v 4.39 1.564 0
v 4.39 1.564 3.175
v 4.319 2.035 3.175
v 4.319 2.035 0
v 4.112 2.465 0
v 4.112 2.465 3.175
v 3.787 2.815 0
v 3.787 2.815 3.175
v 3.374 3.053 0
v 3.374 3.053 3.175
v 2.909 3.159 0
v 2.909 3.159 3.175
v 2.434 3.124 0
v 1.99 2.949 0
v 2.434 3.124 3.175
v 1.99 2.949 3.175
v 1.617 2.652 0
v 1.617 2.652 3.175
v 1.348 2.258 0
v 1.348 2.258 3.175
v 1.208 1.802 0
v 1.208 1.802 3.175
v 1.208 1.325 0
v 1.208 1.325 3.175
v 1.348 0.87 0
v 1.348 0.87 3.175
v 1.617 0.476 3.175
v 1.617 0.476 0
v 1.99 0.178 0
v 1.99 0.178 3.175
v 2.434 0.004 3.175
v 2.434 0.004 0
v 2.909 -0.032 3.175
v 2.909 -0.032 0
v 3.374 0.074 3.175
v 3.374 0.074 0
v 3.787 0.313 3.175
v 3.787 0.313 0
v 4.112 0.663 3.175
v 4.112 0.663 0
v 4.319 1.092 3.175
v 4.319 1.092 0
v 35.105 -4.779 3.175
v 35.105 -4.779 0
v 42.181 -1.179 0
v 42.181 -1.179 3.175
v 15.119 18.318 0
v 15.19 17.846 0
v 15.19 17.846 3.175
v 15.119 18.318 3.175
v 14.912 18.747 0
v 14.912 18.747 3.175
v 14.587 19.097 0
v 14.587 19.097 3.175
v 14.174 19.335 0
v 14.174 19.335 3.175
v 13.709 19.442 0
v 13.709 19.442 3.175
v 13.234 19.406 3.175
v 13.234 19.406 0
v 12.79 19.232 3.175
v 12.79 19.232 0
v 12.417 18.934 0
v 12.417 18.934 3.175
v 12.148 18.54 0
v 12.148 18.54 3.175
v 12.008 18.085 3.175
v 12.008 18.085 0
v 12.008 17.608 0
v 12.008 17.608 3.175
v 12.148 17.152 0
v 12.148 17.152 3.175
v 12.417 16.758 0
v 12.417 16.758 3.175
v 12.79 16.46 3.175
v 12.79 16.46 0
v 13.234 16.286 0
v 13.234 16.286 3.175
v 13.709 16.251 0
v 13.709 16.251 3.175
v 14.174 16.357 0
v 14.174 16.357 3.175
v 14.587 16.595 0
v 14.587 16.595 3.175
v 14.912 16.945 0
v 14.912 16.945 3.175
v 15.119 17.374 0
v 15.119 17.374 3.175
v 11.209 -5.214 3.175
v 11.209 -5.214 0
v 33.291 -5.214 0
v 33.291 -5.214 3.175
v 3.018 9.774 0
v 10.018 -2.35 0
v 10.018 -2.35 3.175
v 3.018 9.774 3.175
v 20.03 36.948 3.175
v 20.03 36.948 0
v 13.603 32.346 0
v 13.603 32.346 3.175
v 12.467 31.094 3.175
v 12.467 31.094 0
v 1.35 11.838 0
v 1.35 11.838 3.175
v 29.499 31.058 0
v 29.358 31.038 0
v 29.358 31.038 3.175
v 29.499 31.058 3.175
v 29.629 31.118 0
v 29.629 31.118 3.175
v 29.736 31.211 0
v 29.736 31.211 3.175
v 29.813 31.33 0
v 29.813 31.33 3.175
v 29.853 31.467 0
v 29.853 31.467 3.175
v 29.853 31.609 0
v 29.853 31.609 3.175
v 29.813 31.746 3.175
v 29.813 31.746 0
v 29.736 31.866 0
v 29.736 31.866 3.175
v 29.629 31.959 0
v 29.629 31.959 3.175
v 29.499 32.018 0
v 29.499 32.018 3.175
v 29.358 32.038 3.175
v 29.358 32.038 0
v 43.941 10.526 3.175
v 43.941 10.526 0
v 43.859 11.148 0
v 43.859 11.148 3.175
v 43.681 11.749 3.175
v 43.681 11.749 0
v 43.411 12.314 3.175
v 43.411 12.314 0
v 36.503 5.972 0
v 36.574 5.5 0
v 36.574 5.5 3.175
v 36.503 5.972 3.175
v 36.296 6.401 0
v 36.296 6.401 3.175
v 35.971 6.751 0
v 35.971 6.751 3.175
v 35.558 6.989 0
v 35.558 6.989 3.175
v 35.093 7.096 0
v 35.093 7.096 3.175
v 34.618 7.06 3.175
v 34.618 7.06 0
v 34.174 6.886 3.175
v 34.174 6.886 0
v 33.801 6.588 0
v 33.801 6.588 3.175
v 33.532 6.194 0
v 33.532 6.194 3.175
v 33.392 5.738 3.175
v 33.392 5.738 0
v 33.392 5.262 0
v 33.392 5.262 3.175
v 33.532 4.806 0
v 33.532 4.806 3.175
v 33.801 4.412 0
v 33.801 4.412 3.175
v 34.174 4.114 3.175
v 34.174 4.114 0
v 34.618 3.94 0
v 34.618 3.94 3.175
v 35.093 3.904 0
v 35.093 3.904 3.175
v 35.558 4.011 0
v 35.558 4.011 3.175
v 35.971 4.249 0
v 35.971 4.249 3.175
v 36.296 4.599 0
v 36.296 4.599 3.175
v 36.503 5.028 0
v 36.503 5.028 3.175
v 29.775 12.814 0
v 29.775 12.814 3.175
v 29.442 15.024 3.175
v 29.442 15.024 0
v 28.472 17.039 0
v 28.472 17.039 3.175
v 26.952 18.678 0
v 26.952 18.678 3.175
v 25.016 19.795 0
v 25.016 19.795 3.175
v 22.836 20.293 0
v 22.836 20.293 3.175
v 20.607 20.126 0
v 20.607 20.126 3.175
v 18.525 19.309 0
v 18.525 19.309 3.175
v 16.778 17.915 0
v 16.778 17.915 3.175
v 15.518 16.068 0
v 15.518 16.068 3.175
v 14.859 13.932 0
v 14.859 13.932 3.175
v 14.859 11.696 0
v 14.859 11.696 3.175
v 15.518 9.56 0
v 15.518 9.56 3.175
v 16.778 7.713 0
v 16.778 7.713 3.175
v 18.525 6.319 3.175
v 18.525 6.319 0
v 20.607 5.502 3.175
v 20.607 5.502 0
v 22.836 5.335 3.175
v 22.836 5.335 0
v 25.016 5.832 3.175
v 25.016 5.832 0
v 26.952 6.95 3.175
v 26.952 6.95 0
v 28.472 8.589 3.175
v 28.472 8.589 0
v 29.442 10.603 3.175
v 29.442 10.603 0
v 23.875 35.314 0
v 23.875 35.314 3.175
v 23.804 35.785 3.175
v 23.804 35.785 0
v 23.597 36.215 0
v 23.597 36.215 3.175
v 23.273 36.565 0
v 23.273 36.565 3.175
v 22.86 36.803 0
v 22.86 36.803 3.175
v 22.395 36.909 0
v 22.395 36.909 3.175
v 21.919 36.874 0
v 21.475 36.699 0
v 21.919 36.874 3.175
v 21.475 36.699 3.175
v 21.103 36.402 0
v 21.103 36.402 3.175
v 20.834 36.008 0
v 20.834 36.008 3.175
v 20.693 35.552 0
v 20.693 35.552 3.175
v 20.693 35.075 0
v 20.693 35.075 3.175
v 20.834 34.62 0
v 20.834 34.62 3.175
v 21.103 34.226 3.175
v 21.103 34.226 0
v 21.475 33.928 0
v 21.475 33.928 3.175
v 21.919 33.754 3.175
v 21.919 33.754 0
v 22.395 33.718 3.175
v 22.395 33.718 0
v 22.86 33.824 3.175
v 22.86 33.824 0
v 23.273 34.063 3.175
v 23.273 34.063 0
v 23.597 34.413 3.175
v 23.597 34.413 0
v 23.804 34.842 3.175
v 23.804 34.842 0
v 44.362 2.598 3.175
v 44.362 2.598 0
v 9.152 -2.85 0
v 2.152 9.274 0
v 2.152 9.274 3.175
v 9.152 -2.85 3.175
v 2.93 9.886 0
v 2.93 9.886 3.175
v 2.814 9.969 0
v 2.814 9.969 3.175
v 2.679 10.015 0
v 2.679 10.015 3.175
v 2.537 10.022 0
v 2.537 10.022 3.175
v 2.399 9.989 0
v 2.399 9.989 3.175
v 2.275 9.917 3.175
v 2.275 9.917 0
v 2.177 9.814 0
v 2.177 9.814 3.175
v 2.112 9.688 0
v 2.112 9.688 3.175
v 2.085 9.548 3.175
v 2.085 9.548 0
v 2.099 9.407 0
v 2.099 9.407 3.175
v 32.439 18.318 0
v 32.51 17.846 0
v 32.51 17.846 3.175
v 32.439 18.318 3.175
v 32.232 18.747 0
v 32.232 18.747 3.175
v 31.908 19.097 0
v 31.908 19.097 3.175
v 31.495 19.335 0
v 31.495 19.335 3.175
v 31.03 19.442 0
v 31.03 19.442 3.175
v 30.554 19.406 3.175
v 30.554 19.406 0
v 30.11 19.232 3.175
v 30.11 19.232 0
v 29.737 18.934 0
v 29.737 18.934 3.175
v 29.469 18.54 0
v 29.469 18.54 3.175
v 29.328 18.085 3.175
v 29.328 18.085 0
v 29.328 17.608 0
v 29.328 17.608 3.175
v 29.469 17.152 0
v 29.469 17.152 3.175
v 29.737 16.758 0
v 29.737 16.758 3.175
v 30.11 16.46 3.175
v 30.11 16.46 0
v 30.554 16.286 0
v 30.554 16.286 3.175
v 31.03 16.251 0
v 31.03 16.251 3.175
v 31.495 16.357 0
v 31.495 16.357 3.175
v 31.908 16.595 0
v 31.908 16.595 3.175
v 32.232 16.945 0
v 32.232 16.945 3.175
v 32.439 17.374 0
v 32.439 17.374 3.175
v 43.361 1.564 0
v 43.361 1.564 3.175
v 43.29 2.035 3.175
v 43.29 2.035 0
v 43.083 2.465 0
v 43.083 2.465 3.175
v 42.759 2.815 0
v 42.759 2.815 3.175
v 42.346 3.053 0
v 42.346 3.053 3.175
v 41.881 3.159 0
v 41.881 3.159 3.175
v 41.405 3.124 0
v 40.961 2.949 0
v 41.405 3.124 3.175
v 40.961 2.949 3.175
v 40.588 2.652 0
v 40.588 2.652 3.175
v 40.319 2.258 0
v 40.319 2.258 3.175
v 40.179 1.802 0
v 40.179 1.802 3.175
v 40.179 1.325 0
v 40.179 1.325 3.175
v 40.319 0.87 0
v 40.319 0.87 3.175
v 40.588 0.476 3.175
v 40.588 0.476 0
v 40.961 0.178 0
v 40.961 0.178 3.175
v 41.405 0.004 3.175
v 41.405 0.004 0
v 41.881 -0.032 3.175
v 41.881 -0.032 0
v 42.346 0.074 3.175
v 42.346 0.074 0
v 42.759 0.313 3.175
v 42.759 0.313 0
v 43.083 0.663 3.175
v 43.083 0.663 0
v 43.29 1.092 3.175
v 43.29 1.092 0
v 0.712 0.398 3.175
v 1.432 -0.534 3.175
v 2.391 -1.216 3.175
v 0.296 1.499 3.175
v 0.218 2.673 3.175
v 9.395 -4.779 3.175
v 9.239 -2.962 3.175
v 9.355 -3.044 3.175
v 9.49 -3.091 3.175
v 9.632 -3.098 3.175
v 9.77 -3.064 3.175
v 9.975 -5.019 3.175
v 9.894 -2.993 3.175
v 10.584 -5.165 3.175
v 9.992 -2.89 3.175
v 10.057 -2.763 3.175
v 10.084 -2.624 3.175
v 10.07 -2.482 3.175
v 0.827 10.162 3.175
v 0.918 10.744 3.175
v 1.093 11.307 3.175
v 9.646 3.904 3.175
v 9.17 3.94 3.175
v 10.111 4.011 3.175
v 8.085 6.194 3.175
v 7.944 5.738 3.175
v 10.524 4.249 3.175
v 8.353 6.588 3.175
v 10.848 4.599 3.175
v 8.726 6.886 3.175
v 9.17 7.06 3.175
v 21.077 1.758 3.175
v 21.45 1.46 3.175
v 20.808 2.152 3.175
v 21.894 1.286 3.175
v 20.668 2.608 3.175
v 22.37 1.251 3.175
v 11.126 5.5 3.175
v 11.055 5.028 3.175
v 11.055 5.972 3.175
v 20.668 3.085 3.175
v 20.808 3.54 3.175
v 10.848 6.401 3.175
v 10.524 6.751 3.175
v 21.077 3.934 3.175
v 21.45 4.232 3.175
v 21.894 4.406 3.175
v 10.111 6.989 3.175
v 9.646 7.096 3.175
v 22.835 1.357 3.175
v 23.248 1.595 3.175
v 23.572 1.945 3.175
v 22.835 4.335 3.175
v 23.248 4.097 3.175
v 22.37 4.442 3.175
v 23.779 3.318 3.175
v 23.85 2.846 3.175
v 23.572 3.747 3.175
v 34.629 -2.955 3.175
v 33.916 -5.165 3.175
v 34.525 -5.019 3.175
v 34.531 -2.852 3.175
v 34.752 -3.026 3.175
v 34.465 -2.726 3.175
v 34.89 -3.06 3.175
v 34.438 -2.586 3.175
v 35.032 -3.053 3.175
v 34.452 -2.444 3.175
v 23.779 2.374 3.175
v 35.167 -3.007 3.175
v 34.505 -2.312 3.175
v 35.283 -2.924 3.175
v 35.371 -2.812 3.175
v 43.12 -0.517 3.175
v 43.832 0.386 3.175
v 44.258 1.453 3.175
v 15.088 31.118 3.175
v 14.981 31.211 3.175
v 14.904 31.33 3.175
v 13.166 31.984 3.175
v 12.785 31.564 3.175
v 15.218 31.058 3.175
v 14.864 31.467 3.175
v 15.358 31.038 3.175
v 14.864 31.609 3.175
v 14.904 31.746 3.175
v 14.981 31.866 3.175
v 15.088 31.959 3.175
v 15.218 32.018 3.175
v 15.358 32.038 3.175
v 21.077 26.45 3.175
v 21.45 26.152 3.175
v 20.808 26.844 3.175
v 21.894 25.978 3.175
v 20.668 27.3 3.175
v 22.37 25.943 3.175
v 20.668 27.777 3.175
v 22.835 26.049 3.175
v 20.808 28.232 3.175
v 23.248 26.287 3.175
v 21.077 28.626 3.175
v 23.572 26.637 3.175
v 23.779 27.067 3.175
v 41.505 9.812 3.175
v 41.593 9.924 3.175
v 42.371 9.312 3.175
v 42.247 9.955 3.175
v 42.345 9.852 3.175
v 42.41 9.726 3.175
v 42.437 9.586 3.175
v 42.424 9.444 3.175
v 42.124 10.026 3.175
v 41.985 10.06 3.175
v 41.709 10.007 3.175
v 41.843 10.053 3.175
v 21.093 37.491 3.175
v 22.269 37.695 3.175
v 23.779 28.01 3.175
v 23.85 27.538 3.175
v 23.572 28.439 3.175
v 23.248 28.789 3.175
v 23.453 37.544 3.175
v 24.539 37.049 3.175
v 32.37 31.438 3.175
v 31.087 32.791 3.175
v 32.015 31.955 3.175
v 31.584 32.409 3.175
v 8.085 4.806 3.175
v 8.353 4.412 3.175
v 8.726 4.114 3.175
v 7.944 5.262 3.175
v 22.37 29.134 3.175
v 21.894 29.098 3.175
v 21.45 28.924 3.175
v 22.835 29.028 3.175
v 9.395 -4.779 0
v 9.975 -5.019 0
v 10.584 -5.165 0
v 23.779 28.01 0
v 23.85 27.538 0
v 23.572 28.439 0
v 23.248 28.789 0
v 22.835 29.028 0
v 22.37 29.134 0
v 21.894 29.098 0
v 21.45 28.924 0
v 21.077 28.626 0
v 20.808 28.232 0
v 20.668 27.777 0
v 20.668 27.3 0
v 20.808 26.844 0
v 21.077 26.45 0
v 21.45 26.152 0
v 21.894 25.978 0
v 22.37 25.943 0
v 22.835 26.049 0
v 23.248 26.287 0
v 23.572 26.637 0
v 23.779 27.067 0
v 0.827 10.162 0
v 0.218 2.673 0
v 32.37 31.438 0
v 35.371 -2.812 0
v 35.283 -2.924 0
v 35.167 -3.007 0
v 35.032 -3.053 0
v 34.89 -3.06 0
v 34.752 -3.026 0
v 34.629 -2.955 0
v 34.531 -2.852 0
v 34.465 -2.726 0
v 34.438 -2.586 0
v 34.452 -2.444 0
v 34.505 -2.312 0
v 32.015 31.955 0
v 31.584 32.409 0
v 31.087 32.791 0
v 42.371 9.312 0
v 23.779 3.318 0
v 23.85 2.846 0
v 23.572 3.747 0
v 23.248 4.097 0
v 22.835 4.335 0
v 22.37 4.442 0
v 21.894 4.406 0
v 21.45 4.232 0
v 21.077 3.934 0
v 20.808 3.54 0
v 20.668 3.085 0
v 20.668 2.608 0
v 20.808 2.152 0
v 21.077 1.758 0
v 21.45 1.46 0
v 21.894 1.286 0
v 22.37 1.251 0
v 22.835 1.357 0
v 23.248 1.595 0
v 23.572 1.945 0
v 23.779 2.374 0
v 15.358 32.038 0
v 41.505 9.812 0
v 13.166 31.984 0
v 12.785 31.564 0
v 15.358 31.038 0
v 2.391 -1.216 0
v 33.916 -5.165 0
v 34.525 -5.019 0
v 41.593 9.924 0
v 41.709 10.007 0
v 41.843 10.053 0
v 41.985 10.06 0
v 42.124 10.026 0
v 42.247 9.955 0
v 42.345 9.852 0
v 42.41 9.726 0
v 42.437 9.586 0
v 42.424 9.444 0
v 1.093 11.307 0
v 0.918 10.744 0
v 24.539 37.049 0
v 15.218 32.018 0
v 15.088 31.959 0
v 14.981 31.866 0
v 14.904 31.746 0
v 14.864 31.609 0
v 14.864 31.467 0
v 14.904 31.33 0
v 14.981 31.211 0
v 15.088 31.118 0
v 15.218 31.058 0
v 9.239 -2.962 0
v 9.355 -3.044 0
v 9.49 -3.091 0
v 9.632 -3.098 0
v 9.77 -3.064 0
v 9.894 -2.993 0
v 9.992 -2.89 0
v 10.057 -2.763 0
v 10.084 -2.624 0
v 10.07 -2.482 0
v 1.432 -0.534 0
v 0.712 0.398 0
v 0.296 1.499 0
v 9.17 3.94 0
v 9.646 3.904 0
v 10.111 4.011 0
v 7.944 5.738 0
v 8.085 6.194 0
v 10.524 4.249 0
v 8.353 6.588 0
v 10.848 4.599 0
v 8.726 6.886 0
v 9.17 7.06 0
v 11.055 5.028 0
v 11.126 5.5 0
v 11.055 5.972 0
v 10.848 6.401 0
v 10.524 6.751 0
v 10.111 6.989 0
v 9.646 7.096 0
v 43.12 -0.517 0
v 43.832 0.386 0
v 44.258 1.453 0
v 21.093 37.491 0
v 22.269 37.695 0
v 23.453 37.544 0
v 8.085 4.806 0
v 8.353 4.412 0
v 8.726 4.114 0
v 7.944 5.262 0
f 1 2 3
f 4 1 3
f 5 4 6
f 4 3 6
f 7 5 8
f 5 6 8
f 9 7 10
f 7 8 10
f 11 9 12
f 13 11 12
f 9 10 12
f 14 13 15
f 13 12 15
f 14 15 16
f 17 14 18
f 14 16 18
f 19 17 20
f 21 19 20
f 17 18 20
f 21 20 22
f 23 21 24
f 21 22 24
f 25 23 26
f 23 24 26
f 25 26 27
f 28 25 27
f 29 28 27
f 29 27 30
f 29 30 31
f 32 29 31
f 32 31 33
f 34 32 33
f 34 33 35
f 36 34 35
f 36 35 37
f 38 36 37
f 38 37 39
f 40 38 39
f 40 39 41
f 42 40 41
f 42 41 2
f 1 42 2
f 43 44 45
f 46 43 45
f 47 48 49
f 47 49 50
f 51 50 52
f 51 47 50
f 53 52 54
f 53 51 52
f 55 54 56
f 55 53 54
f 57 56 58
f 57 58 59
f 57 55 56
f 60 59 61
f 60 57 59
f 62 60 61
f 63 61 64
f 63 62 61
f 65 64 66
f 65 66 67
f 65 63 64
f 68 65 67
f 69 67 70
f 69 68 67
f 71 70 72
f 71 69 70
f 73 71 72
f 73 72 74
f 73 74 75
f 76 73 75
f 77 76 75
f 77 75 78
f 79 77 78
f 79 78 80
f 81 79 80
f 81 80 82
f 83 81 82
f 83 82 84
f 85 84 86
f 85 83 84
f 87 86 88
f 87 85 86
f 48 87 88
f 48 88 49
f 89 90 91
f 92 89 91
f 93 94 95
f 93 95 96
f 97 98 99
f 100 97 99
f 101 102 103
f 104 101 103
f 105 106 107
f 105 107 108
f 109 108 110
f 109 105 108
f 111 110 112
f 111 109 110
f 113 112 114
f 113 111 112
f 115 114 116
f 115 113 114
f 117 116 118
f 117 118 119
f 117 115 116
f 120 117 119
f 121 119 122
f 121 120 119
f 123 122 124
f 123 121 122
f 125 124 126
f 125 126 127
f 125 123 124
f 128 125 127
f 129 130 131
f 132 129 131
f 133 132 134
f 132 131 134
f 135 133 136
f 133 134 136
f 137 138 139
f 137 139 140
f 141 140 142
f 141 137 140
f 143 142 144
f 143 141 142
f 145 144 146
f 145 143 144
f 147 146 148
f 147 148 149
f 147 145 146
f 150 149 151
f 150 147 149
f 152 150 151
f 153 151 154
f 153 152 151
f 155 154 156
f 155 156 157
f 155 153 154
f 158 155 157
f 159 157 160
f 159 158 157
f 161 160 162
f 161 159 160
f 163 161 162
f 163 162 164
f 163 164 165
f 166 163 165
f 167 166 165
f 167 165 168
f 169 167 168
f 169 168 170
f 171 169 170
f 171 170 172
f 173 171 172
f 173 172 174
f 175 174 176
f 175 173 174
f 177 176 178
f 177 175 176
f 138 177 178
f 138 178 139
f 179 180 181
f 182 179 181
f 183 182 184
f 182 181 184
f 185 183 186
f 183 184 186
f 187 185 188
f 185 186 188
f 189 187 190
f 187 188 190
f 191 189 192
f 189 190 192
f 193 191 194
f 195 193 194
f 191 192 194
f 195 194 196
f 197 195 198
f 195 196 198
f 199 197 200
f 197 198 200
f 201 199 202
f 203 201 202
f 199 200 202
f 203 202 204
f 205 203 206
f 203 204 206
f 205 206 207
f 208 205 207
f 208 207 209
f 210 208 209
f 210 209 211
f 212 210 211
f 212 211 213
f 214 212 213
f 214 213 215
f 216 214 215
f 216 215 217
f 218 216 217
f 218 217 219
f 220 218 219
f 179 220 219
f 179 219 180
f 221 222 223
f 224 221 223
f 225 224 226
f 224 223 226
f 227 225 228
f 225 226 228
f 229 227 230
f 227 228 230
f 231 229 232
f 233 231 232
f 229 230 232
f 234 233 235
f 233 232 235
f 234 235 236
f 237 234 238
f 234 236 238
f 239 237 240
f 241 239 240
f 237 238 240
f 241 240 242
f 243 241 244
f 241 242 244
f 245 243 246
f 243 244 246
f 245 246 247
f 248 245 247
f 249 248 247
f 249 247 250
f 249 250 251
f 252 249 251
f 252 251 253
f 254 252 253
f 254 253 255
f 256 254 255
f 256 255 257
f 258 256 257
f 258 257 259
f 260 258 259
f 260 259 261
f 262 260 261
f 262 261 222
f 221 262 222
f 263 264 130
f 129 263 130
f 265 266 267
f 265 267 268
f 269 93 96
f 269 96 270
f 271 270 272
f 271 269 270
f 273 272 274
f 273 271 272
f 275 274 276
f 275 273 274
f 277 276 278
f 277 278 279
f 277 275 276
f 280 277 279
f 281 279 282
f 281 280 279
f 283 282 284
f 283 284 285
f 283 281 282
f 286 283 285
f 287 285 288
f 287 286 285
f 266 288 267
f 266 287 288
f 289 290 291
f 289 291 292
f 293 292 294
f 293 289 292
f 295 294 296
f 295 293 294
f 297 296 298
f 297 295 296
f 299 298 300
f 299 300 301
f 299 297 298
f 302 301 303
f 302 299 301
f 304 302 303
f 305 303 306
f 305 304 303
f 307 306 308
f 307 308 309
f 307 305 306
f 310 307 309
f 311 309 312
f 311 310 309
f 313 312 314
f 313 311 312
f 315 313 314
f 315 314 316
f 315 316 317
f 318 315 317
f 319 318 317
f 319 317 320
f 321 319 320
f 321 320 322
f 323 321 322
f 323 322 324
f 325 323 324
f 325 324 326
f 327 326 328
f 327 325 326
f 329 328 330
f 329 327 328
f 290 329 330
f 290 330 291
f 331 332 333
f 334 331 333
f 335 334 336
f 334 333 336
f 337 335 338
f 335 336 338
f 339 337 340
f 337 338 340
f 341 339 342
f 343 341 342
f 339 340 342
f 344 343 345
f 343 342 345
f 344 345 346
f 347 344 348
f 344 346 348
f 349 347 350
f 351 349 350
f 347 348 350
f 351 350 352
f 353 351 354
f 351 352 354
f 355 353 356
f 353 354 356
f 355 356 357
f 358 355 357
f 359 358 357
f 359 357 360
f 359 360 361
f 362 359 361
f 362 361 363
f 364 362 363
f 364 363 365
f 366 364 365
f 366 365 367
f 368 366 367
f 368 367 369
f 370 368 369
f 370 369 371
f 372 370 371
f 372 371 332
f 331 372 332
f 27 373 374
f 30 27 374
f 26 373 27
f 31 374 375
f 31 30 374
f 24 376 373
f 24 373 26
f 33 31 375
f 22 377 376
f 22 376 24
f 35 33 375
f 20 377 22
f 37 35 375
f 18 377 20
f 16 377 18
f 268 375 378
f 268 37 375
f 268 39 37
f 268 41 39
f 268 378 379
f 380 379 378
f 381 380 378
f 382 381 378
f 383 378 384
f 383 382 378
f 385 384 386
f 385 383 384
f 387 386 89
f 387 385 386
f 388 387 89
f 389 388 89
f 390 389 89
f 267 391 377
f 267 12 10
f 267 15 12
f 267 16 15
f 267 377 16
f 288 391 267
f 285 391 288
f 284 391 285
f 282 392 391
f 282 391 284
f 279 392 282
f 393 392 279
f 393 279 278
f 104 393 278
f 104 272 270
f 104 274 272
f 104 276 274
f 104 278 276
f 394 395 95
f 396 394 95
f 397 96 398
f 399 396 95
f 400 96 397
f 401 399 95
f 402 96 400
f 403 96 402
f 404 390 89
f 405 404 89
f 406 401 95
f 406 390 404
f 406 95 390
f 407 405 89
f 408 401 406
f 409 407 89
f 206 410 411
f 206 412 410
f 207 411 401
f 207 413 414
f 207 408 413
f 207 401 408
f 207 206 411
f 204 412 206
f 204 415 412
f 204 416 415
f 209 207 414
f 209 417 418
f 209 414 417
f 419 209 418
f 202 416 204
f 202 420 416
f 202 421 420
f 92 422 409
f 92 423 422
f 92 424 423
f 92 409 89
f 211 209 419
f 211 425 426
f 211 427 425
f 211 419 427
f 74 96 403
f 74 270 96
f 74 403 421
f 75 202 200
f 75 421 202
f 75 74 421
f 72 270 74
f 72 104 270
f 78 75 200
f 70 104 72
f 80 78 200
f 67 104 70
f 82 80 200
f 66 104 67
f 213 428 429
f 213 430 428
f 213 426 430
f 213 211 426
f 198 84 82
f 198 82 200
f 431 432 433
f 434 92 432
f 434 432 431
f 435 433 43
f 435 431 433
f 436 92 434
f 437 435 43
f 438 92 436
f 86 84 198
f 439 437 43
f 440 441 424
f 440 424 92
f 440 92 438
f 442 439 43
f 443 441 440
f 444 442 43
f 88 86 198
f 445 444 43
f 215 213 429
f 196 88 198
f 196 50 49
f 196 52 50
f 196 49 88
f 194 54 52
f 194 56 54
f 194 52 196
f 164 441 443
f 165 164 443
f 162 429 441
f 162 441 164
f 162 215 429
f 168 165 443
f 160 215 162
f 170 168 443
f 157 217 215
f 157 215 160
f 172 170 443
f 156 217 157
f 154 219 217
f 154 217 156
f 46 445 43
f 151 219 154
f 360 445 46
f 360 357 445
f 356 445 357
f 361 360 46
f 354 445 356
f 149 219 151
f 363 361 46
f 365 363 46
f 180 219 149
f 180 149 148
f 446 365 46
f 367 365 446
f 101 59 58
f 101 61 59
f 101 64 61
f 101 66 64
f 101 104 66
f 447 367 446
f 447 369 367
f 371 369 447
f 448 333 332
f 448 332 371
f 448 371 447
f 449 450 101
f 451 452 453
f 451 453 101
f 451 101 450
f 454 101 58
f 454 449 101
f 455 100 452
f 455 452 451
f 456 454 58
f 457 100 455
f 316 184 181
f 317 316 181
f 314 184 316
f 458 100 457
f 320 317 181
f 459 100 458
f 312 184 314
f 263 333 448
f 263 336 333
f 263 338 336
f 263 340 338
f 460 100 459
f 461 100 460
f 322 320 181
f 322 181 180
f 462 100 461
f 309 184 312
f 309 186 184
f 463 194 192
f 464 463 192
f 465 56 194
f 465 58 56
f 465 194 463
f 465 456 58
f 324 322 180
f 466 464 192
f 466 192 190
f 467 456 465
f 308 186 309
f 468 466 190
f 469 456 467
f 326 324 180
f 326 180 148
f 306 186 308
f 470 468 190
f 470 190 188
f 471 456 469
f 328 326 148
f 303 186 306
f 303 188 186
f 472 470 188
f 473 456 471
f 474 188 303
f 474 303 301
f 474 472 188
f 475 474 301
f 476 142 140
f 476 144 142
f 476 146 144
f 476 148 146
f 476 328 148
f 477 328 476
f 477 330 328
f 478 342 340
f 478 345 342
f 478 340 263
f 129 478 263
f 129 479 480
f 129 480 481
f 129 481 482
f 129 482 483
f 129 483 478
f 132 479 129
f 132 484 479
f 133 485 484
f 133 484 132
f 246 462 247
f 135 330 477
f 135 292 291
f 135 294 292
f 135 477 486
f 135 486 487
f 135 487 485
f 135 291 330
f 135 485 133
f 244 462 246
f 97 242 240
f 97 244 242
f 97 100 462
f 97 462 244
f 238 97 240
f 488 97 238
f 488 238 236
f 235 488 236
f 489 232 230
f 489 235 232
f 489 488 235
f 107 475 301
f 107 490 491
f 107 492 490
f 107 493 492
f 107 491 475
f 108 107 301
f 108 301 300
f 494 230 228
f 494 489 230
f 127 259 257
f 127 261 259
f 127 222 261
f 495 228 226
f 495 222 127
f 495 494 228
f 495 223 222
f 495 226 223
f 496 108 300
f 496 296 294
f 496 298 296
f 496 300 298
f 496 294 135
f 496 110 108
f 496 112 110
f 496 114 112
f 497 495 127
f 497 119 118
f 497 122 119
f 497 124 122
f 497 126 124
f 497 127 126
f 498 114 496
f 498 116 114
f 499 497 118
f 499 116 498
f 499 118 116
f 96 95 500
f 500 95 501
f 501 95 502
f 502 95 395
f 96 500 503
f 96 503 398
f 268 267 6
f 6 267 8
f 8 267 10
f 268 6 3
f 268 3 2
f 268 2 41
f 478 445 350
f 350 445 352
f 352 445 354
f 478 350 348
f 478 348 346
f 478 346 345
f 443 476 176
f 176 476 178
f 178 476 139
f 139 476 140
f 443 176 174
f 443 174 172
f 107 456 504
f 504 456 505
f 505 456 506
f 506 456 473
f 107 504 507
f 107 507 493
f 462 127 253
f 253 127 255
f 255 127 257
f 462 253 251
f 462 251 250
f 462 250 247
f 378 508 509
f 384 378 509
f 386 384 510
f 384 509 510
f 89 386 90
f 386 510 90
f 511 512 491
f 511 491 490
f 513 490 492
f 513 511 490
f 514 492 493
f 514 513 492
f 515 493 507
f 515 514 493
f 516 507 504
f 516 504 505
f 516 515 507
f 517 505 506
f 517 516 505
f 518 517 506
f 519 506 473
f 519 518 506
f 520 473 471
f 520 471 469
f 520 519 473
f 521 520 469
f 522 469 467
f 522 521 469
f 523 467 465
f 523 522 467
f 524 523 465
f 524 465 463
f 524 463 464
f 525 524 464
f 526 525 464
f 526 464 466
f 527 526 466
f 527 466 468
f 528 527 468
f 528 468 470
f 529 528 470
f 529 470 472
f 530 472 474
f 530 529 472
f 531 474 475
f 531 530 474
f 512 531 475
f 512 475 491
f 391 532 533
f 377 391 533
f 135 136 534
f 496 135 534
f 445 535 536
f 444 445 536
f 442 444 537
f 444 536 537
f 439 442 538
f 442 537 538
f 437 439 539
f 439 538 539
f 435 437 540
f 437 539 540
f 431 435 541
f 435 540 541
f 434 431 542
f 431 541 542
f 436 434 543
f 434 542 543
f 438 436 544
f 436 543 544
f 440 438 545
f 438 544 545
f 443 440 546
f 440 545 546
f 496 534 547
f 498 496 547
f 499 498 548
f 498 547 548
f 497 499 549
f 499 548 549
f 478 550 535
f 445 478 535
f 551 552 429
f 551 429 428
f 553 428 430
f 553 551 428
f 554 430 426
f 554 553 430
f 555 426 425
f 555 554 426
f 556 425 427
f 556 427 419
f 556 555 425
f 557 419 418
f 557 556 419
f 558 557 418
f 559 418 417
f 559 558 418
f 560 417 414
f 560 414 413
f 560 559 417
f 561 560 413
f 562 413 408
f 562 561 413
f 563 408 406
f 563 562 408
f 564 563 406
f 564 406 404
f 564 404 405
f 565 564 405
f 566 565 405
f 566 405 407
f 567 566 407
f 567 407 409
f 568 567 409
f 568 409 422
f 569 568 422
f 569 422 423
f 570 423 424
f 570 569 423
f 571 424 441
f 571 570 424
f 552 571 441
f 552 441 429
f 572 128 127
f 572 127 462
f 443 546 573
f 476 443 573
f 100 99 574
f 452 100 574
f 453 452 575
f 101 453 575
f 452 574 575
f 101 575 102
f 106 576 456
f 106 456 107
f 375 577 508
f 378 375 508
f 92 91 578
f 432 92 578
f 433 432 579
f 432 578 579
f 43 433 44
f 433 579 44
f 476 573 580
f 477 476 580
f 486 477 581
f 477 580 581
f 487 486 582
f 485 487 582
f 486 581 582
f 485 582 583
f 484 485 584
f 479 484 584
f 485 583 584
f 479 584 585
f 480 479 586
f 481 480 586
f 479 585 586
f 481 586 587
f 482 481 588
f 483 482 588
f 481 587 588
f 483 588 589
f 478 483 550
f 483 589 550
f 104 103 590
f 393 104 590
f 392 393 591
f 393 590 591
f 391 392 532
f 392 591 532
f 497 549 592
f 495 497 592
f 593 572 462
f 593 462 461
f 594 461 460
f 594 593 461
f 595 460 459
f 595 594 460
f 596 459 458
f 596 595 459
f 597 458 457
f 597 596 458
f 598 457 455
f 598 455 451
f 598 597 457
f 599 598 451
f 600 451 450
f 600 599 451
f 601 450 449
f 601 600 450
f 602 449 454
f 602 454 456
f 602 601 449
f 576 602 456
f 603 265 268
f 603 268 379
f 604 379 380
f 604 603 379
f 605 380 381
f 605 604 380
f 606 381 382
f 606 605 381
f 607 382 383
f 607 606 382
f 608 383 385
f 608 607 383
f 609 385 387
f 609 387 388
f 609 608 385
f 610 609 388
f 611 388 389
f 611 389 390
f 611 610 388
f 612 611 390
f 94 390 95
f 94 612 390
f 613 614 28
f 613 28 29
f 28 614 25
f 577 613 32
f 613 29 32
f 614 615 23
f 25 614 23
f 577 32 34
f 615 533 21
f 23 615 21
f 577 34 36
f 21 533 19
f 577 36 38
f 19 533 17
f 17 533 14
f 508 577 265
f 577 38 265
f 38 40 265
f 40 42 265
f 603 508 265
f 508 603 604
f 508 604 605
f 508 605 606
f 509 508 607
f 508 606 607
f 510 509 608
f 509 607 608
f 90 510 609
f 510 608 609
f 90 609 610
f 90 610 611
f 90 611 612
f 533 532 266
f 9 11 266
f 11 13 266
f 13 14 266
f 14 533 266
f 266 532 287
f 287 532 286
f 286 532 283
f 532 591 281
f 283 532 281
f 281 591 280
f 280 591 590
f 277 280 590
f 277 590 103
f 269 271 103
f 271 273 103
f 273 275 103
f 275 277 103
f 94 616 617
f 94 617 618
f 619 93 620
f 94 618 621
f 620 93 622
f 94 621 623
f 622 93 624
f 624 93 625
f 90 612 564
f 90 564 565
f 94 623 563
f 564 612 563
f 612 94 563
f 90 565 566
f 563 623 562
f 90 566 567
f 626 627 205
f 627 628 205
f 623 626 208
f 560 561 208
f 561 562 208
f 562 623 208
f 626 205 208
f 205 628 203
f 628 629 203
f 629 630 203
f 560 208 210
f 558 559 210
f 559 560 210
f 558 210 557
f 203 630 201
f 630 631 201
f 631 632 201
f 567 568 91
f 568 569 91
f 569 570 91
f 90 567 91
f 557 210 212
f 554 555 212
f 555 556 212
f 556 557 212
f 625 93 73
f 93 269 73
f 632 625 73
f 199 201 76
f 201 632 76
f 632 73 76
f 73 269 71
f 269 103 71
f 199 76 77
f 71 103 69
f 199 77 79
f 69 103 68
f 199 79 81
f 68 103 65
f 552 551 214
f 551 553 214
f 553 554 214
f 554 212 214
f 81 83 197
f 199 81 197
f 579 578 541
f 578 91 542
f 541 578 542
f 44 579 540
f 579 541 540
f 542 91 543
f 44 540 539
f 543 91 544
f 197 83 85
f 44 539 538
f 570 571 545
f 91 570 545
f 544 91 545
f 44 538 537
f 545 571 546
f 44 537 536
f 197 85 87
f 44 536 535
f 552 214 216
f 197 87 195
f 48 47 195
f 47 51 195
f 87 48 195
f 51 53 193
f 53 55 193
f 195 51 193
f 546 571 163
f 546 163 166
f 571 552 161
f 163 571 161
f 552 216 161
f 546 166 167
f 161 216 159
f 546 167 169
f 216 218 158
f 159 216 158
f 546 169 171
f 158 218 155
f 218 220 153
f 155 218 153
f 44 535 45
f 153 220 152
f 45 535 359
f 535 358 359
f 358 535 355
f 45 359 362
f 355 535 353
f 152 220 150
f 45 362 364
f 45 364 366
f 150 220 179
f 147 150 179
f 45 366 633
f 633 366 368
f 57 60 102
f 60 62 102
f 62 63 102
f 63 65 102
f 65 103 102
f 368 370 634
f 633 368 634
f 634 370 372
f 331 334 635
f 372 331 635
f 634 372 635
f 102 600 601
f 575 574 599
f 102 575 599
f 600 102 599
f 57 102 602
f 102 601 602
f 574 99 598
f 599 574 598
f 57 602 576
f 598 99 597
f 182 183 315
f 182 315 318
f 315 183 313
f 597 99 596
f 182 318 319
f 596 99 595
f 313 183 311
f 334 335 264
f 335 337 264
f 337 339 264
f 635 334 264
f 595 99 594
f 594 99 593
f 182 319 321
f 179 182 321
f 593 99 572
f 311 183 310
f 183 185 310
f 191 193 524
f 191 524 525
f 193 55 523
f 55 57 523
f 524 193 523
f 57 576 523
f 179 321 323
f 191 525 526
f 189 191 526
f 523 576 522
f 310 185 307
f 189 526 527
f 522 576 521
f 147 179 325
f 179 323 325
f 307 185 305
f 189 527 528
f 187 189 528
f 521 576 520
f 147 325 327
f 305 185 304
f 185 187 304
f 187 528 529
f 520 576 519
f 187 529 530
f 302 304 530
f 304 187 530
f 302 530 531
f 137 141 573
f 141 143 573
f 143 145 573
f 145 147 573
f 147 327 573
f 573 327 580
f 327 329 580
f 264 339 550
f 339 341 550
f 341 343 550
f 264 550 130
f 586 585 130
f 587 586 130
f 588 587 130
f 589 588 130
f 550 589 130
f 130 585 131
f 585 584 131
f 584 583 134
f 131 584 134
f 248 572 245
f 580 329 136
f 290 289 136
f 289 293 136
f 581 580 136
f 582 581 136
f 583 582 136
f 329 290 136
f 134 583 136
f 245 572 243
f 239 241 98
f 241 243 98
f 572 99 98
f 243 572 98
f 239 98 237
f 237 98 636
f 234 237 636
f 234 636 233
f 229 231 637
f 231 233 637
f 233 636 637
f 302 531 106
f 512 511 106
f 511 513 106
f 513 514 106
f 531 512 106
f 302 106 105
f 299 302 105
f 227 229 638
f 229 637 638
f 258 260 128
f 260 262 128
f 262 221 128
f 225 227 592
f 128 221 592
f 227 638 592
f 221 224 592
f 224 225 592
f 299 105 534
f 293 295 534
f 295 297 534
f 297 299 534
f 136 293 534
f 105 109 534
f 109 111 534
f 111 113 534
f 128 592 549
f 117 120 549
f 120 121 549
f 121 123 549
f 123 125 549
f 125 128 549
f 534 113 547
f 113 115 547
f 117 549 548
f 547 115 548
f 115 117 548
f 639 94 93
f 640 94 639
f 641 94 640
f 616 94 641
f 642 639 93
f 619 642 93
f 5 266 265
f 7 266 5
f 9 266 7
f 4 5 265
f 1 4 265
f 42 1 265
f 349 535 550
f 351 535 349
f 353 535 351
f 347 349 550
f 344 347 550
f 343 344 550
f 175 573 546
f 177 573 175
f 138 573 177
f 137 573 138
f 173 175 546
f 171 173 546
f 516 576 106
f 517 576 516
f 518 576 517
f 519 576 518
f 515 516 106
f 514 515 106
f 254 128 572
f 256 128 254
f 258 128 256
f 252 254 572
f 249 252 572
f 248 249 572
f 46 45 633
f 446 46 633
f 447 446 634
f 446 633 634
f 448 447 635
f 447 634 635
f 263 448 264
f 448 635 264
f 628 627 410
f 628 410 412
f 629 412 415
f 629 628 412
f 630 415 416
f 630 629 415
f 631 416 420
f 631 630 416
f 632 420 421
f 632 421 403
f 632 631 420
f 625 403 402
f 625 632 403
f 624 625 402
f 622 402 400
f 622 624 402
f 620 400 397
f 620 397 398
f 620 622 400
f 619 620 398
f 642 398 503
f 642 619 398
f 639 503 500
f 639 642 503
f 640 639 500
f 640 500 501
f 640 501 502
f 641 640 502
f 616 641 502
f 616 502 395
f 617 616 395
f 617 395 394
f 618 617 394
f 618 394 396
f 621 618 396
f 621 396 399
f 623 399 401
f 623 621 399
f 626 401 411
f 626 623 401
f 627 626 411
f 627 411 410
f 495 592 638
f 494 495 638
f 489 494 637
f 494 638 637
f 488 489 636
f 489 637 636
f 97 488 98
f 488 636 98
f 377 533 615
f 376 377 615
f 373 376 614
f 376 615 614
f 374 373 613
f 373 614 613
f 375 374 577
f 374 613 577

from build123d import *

# Parameters (mm, degrees)
SKETCH1_R           = 1.6
BOSS_EXTRUDE1_DEPTH = 3.175
SKETCH2_R           = 1.6
SKETCH2_R_2         = 7.5
CUT_EXTRUDE1_DEPTH  = 4.175


with BuildPart() as part:
    # Sketch1 → Boss-Extrude1 (new body)
    with BuildSketch(Plane.XY):
        with BuildLine():
            Line((31.086717458, 32.79124845), (24.539210672, 37.049362302))
            ThreePointArc((24.539210672, 37.049362302), (22.268882249, 37.695107847), (20.029743315, 36.948358029))
            Line((20.029743315, 36.948358029), (13.602836128, 32.346493758))
            ThreePointArc((13.602836128, 32.346493758), (12.968237383, 31.781029757), (12.467444066, 31.094246563))
            Line((12.467444066, 31.094246563), (1.349560594, 11.837507517))
            ThreePointArc((1.349560594, 11.837507517), (0.995156132, 11.028730142), (0.826837821, 10.16190126))
            Line((0.826837821, 10.16190126), (0.217529035, 2.673448792))
            ThreePointArc((0.217529035, 2.673448792), (0.712425098, 0.398045931), (2.390731369, -1.216162343))
            Line((2.390731369, -1.216162343), (9.39530455, -4.779380795))
            ThreePointArc((9.39530455, -4.779380795), (10.276421795, -5.10394936), (11.208926603, -5.214163404))
            Line((11.208926603, -5.214163404), (33.291073397, -5.214163404))
            ThreePointArc((33.291073397, -5.214163404), (34.223578205, -5.10394936), (35.10469545, -4.779380795))
            Line((35.10469545, -4.779380795), (42.181392008, -1.179473262))
            ThreePointArc((42.181392008, -1.179473262), (43.83187157, 0.385744129), (44.362149812, 2.597710054))
            Line((44.362149812, 2.597710054), (43.941412908, 10.526262814))
            ThreePointArc((43.941412908, 10.526262814), (43.781938908, 11.451617014), (43.411134666, 12.314296889))
            Line((43.411134666, 12.314296889), (32.370061269, 31.437996983))
            ThreePointArc((32.370061269, 31.437996983), (31.808360702, 32.190462814), (31.086717458, 32.79124845))
        make_face()
        with Locations((13.589745962, 17.846043489)):
            Circle(SKETCH1_R, mode=Mode.SUBTRACT)
        with Locations((9.526279442, 5.5)):
            Circle(SKETCH1_R, mode=Mode.SUBTRACT)
        with Locations((34.973720558, 5.5)):
            Circle(SKETCH1_R, mode=Mode.SUBTRACT)
        with Locations((30.910254038, 17.846043489)):
            Circle(SKETCH1_R, mode=Mode.SUBTRACT)
        with Locations((22.25, 27.538130468)):
            Circle(SKETCH1_R, mode=Mode.SUBTRACT)
        with Locations((22.25, 2.846043489)):
            Circle(SKETCH1_R, mode=Mode.SUBTRACT)
        with BuildLine():
            Line((42.370834875, 9.312177826), (35.370834875, -2.812177826))
            ThreePointArc((35.370834875, -2.812177826), (34.687822174, -2.995190528), (34.504809472, -2.312177826))
            Line((34.504809472, -2.312177826), (41.504809472, 9.812177826))
            ThreePointArc((41.504809472, 9.812177826), (42.187822174, 9.995190528), (42.370834875, 9.312177826))
        make_face(mode=Mode.SUBTRACT)
        with BuildLine():
            Line((10.01754221, -2.349929674), (3.01754221, 9.774425979))
            ThreePointArc((3.01754221, 9.774425979), (2.334529508, 9.957438681), (2.151516806, 9.274425979))
            Line((2.151516806, 9.274425979), (9.151516806, -2.849929674))
            ThreePointArc((9.151516806, -2.849929674), (9.834529508, -3.032942376), (10.01754221, -2.349929674))
        make_face(mode=Mode.SUBTRACT)
        with BuildLine():
            Line((15.358452868, 31.038130468), (29.358452868, 31.038130468))
            ThreePointArc((29.358452868, 31.038130468), (29.858452868, 31.538130468), (29.358452868, 32.038130468))
            Line((29.358452868, 32.038130468), (15.358452868, 32.038130468))
            ThreePointArc((15.358452868, 32.038130468), (14.858452868, 31.538130468), (15.358452868, 31.038130468))
        make_face(mode=Mode.SUBTRACT)
    extrude(amount=BOSS_EXTRUDE1_DEPTH)

    # Sketch2 → Cut-Extrude1 (cut, through all)
    with BuildSketch(Plane.XY.offset(3.175)):
        with Locations((41.761034996, 1.563830145)):
            Circle(SKETCH2_R)
        with Locations((2.789891826, 1.563830145)):
            Circle(SKETCH2_R)
        with Locations((22.275463411, 12.813830145)):
            Circle(SKETCH2_R_2)
        with Locations((22.275463411, 35.313830145)):
            Circle(SKETCH2_R)
    extrude(amount=-CUT_EXTRUDE1_DEPTH, mode=Mode.SUBTRACT)


solid = part.part
